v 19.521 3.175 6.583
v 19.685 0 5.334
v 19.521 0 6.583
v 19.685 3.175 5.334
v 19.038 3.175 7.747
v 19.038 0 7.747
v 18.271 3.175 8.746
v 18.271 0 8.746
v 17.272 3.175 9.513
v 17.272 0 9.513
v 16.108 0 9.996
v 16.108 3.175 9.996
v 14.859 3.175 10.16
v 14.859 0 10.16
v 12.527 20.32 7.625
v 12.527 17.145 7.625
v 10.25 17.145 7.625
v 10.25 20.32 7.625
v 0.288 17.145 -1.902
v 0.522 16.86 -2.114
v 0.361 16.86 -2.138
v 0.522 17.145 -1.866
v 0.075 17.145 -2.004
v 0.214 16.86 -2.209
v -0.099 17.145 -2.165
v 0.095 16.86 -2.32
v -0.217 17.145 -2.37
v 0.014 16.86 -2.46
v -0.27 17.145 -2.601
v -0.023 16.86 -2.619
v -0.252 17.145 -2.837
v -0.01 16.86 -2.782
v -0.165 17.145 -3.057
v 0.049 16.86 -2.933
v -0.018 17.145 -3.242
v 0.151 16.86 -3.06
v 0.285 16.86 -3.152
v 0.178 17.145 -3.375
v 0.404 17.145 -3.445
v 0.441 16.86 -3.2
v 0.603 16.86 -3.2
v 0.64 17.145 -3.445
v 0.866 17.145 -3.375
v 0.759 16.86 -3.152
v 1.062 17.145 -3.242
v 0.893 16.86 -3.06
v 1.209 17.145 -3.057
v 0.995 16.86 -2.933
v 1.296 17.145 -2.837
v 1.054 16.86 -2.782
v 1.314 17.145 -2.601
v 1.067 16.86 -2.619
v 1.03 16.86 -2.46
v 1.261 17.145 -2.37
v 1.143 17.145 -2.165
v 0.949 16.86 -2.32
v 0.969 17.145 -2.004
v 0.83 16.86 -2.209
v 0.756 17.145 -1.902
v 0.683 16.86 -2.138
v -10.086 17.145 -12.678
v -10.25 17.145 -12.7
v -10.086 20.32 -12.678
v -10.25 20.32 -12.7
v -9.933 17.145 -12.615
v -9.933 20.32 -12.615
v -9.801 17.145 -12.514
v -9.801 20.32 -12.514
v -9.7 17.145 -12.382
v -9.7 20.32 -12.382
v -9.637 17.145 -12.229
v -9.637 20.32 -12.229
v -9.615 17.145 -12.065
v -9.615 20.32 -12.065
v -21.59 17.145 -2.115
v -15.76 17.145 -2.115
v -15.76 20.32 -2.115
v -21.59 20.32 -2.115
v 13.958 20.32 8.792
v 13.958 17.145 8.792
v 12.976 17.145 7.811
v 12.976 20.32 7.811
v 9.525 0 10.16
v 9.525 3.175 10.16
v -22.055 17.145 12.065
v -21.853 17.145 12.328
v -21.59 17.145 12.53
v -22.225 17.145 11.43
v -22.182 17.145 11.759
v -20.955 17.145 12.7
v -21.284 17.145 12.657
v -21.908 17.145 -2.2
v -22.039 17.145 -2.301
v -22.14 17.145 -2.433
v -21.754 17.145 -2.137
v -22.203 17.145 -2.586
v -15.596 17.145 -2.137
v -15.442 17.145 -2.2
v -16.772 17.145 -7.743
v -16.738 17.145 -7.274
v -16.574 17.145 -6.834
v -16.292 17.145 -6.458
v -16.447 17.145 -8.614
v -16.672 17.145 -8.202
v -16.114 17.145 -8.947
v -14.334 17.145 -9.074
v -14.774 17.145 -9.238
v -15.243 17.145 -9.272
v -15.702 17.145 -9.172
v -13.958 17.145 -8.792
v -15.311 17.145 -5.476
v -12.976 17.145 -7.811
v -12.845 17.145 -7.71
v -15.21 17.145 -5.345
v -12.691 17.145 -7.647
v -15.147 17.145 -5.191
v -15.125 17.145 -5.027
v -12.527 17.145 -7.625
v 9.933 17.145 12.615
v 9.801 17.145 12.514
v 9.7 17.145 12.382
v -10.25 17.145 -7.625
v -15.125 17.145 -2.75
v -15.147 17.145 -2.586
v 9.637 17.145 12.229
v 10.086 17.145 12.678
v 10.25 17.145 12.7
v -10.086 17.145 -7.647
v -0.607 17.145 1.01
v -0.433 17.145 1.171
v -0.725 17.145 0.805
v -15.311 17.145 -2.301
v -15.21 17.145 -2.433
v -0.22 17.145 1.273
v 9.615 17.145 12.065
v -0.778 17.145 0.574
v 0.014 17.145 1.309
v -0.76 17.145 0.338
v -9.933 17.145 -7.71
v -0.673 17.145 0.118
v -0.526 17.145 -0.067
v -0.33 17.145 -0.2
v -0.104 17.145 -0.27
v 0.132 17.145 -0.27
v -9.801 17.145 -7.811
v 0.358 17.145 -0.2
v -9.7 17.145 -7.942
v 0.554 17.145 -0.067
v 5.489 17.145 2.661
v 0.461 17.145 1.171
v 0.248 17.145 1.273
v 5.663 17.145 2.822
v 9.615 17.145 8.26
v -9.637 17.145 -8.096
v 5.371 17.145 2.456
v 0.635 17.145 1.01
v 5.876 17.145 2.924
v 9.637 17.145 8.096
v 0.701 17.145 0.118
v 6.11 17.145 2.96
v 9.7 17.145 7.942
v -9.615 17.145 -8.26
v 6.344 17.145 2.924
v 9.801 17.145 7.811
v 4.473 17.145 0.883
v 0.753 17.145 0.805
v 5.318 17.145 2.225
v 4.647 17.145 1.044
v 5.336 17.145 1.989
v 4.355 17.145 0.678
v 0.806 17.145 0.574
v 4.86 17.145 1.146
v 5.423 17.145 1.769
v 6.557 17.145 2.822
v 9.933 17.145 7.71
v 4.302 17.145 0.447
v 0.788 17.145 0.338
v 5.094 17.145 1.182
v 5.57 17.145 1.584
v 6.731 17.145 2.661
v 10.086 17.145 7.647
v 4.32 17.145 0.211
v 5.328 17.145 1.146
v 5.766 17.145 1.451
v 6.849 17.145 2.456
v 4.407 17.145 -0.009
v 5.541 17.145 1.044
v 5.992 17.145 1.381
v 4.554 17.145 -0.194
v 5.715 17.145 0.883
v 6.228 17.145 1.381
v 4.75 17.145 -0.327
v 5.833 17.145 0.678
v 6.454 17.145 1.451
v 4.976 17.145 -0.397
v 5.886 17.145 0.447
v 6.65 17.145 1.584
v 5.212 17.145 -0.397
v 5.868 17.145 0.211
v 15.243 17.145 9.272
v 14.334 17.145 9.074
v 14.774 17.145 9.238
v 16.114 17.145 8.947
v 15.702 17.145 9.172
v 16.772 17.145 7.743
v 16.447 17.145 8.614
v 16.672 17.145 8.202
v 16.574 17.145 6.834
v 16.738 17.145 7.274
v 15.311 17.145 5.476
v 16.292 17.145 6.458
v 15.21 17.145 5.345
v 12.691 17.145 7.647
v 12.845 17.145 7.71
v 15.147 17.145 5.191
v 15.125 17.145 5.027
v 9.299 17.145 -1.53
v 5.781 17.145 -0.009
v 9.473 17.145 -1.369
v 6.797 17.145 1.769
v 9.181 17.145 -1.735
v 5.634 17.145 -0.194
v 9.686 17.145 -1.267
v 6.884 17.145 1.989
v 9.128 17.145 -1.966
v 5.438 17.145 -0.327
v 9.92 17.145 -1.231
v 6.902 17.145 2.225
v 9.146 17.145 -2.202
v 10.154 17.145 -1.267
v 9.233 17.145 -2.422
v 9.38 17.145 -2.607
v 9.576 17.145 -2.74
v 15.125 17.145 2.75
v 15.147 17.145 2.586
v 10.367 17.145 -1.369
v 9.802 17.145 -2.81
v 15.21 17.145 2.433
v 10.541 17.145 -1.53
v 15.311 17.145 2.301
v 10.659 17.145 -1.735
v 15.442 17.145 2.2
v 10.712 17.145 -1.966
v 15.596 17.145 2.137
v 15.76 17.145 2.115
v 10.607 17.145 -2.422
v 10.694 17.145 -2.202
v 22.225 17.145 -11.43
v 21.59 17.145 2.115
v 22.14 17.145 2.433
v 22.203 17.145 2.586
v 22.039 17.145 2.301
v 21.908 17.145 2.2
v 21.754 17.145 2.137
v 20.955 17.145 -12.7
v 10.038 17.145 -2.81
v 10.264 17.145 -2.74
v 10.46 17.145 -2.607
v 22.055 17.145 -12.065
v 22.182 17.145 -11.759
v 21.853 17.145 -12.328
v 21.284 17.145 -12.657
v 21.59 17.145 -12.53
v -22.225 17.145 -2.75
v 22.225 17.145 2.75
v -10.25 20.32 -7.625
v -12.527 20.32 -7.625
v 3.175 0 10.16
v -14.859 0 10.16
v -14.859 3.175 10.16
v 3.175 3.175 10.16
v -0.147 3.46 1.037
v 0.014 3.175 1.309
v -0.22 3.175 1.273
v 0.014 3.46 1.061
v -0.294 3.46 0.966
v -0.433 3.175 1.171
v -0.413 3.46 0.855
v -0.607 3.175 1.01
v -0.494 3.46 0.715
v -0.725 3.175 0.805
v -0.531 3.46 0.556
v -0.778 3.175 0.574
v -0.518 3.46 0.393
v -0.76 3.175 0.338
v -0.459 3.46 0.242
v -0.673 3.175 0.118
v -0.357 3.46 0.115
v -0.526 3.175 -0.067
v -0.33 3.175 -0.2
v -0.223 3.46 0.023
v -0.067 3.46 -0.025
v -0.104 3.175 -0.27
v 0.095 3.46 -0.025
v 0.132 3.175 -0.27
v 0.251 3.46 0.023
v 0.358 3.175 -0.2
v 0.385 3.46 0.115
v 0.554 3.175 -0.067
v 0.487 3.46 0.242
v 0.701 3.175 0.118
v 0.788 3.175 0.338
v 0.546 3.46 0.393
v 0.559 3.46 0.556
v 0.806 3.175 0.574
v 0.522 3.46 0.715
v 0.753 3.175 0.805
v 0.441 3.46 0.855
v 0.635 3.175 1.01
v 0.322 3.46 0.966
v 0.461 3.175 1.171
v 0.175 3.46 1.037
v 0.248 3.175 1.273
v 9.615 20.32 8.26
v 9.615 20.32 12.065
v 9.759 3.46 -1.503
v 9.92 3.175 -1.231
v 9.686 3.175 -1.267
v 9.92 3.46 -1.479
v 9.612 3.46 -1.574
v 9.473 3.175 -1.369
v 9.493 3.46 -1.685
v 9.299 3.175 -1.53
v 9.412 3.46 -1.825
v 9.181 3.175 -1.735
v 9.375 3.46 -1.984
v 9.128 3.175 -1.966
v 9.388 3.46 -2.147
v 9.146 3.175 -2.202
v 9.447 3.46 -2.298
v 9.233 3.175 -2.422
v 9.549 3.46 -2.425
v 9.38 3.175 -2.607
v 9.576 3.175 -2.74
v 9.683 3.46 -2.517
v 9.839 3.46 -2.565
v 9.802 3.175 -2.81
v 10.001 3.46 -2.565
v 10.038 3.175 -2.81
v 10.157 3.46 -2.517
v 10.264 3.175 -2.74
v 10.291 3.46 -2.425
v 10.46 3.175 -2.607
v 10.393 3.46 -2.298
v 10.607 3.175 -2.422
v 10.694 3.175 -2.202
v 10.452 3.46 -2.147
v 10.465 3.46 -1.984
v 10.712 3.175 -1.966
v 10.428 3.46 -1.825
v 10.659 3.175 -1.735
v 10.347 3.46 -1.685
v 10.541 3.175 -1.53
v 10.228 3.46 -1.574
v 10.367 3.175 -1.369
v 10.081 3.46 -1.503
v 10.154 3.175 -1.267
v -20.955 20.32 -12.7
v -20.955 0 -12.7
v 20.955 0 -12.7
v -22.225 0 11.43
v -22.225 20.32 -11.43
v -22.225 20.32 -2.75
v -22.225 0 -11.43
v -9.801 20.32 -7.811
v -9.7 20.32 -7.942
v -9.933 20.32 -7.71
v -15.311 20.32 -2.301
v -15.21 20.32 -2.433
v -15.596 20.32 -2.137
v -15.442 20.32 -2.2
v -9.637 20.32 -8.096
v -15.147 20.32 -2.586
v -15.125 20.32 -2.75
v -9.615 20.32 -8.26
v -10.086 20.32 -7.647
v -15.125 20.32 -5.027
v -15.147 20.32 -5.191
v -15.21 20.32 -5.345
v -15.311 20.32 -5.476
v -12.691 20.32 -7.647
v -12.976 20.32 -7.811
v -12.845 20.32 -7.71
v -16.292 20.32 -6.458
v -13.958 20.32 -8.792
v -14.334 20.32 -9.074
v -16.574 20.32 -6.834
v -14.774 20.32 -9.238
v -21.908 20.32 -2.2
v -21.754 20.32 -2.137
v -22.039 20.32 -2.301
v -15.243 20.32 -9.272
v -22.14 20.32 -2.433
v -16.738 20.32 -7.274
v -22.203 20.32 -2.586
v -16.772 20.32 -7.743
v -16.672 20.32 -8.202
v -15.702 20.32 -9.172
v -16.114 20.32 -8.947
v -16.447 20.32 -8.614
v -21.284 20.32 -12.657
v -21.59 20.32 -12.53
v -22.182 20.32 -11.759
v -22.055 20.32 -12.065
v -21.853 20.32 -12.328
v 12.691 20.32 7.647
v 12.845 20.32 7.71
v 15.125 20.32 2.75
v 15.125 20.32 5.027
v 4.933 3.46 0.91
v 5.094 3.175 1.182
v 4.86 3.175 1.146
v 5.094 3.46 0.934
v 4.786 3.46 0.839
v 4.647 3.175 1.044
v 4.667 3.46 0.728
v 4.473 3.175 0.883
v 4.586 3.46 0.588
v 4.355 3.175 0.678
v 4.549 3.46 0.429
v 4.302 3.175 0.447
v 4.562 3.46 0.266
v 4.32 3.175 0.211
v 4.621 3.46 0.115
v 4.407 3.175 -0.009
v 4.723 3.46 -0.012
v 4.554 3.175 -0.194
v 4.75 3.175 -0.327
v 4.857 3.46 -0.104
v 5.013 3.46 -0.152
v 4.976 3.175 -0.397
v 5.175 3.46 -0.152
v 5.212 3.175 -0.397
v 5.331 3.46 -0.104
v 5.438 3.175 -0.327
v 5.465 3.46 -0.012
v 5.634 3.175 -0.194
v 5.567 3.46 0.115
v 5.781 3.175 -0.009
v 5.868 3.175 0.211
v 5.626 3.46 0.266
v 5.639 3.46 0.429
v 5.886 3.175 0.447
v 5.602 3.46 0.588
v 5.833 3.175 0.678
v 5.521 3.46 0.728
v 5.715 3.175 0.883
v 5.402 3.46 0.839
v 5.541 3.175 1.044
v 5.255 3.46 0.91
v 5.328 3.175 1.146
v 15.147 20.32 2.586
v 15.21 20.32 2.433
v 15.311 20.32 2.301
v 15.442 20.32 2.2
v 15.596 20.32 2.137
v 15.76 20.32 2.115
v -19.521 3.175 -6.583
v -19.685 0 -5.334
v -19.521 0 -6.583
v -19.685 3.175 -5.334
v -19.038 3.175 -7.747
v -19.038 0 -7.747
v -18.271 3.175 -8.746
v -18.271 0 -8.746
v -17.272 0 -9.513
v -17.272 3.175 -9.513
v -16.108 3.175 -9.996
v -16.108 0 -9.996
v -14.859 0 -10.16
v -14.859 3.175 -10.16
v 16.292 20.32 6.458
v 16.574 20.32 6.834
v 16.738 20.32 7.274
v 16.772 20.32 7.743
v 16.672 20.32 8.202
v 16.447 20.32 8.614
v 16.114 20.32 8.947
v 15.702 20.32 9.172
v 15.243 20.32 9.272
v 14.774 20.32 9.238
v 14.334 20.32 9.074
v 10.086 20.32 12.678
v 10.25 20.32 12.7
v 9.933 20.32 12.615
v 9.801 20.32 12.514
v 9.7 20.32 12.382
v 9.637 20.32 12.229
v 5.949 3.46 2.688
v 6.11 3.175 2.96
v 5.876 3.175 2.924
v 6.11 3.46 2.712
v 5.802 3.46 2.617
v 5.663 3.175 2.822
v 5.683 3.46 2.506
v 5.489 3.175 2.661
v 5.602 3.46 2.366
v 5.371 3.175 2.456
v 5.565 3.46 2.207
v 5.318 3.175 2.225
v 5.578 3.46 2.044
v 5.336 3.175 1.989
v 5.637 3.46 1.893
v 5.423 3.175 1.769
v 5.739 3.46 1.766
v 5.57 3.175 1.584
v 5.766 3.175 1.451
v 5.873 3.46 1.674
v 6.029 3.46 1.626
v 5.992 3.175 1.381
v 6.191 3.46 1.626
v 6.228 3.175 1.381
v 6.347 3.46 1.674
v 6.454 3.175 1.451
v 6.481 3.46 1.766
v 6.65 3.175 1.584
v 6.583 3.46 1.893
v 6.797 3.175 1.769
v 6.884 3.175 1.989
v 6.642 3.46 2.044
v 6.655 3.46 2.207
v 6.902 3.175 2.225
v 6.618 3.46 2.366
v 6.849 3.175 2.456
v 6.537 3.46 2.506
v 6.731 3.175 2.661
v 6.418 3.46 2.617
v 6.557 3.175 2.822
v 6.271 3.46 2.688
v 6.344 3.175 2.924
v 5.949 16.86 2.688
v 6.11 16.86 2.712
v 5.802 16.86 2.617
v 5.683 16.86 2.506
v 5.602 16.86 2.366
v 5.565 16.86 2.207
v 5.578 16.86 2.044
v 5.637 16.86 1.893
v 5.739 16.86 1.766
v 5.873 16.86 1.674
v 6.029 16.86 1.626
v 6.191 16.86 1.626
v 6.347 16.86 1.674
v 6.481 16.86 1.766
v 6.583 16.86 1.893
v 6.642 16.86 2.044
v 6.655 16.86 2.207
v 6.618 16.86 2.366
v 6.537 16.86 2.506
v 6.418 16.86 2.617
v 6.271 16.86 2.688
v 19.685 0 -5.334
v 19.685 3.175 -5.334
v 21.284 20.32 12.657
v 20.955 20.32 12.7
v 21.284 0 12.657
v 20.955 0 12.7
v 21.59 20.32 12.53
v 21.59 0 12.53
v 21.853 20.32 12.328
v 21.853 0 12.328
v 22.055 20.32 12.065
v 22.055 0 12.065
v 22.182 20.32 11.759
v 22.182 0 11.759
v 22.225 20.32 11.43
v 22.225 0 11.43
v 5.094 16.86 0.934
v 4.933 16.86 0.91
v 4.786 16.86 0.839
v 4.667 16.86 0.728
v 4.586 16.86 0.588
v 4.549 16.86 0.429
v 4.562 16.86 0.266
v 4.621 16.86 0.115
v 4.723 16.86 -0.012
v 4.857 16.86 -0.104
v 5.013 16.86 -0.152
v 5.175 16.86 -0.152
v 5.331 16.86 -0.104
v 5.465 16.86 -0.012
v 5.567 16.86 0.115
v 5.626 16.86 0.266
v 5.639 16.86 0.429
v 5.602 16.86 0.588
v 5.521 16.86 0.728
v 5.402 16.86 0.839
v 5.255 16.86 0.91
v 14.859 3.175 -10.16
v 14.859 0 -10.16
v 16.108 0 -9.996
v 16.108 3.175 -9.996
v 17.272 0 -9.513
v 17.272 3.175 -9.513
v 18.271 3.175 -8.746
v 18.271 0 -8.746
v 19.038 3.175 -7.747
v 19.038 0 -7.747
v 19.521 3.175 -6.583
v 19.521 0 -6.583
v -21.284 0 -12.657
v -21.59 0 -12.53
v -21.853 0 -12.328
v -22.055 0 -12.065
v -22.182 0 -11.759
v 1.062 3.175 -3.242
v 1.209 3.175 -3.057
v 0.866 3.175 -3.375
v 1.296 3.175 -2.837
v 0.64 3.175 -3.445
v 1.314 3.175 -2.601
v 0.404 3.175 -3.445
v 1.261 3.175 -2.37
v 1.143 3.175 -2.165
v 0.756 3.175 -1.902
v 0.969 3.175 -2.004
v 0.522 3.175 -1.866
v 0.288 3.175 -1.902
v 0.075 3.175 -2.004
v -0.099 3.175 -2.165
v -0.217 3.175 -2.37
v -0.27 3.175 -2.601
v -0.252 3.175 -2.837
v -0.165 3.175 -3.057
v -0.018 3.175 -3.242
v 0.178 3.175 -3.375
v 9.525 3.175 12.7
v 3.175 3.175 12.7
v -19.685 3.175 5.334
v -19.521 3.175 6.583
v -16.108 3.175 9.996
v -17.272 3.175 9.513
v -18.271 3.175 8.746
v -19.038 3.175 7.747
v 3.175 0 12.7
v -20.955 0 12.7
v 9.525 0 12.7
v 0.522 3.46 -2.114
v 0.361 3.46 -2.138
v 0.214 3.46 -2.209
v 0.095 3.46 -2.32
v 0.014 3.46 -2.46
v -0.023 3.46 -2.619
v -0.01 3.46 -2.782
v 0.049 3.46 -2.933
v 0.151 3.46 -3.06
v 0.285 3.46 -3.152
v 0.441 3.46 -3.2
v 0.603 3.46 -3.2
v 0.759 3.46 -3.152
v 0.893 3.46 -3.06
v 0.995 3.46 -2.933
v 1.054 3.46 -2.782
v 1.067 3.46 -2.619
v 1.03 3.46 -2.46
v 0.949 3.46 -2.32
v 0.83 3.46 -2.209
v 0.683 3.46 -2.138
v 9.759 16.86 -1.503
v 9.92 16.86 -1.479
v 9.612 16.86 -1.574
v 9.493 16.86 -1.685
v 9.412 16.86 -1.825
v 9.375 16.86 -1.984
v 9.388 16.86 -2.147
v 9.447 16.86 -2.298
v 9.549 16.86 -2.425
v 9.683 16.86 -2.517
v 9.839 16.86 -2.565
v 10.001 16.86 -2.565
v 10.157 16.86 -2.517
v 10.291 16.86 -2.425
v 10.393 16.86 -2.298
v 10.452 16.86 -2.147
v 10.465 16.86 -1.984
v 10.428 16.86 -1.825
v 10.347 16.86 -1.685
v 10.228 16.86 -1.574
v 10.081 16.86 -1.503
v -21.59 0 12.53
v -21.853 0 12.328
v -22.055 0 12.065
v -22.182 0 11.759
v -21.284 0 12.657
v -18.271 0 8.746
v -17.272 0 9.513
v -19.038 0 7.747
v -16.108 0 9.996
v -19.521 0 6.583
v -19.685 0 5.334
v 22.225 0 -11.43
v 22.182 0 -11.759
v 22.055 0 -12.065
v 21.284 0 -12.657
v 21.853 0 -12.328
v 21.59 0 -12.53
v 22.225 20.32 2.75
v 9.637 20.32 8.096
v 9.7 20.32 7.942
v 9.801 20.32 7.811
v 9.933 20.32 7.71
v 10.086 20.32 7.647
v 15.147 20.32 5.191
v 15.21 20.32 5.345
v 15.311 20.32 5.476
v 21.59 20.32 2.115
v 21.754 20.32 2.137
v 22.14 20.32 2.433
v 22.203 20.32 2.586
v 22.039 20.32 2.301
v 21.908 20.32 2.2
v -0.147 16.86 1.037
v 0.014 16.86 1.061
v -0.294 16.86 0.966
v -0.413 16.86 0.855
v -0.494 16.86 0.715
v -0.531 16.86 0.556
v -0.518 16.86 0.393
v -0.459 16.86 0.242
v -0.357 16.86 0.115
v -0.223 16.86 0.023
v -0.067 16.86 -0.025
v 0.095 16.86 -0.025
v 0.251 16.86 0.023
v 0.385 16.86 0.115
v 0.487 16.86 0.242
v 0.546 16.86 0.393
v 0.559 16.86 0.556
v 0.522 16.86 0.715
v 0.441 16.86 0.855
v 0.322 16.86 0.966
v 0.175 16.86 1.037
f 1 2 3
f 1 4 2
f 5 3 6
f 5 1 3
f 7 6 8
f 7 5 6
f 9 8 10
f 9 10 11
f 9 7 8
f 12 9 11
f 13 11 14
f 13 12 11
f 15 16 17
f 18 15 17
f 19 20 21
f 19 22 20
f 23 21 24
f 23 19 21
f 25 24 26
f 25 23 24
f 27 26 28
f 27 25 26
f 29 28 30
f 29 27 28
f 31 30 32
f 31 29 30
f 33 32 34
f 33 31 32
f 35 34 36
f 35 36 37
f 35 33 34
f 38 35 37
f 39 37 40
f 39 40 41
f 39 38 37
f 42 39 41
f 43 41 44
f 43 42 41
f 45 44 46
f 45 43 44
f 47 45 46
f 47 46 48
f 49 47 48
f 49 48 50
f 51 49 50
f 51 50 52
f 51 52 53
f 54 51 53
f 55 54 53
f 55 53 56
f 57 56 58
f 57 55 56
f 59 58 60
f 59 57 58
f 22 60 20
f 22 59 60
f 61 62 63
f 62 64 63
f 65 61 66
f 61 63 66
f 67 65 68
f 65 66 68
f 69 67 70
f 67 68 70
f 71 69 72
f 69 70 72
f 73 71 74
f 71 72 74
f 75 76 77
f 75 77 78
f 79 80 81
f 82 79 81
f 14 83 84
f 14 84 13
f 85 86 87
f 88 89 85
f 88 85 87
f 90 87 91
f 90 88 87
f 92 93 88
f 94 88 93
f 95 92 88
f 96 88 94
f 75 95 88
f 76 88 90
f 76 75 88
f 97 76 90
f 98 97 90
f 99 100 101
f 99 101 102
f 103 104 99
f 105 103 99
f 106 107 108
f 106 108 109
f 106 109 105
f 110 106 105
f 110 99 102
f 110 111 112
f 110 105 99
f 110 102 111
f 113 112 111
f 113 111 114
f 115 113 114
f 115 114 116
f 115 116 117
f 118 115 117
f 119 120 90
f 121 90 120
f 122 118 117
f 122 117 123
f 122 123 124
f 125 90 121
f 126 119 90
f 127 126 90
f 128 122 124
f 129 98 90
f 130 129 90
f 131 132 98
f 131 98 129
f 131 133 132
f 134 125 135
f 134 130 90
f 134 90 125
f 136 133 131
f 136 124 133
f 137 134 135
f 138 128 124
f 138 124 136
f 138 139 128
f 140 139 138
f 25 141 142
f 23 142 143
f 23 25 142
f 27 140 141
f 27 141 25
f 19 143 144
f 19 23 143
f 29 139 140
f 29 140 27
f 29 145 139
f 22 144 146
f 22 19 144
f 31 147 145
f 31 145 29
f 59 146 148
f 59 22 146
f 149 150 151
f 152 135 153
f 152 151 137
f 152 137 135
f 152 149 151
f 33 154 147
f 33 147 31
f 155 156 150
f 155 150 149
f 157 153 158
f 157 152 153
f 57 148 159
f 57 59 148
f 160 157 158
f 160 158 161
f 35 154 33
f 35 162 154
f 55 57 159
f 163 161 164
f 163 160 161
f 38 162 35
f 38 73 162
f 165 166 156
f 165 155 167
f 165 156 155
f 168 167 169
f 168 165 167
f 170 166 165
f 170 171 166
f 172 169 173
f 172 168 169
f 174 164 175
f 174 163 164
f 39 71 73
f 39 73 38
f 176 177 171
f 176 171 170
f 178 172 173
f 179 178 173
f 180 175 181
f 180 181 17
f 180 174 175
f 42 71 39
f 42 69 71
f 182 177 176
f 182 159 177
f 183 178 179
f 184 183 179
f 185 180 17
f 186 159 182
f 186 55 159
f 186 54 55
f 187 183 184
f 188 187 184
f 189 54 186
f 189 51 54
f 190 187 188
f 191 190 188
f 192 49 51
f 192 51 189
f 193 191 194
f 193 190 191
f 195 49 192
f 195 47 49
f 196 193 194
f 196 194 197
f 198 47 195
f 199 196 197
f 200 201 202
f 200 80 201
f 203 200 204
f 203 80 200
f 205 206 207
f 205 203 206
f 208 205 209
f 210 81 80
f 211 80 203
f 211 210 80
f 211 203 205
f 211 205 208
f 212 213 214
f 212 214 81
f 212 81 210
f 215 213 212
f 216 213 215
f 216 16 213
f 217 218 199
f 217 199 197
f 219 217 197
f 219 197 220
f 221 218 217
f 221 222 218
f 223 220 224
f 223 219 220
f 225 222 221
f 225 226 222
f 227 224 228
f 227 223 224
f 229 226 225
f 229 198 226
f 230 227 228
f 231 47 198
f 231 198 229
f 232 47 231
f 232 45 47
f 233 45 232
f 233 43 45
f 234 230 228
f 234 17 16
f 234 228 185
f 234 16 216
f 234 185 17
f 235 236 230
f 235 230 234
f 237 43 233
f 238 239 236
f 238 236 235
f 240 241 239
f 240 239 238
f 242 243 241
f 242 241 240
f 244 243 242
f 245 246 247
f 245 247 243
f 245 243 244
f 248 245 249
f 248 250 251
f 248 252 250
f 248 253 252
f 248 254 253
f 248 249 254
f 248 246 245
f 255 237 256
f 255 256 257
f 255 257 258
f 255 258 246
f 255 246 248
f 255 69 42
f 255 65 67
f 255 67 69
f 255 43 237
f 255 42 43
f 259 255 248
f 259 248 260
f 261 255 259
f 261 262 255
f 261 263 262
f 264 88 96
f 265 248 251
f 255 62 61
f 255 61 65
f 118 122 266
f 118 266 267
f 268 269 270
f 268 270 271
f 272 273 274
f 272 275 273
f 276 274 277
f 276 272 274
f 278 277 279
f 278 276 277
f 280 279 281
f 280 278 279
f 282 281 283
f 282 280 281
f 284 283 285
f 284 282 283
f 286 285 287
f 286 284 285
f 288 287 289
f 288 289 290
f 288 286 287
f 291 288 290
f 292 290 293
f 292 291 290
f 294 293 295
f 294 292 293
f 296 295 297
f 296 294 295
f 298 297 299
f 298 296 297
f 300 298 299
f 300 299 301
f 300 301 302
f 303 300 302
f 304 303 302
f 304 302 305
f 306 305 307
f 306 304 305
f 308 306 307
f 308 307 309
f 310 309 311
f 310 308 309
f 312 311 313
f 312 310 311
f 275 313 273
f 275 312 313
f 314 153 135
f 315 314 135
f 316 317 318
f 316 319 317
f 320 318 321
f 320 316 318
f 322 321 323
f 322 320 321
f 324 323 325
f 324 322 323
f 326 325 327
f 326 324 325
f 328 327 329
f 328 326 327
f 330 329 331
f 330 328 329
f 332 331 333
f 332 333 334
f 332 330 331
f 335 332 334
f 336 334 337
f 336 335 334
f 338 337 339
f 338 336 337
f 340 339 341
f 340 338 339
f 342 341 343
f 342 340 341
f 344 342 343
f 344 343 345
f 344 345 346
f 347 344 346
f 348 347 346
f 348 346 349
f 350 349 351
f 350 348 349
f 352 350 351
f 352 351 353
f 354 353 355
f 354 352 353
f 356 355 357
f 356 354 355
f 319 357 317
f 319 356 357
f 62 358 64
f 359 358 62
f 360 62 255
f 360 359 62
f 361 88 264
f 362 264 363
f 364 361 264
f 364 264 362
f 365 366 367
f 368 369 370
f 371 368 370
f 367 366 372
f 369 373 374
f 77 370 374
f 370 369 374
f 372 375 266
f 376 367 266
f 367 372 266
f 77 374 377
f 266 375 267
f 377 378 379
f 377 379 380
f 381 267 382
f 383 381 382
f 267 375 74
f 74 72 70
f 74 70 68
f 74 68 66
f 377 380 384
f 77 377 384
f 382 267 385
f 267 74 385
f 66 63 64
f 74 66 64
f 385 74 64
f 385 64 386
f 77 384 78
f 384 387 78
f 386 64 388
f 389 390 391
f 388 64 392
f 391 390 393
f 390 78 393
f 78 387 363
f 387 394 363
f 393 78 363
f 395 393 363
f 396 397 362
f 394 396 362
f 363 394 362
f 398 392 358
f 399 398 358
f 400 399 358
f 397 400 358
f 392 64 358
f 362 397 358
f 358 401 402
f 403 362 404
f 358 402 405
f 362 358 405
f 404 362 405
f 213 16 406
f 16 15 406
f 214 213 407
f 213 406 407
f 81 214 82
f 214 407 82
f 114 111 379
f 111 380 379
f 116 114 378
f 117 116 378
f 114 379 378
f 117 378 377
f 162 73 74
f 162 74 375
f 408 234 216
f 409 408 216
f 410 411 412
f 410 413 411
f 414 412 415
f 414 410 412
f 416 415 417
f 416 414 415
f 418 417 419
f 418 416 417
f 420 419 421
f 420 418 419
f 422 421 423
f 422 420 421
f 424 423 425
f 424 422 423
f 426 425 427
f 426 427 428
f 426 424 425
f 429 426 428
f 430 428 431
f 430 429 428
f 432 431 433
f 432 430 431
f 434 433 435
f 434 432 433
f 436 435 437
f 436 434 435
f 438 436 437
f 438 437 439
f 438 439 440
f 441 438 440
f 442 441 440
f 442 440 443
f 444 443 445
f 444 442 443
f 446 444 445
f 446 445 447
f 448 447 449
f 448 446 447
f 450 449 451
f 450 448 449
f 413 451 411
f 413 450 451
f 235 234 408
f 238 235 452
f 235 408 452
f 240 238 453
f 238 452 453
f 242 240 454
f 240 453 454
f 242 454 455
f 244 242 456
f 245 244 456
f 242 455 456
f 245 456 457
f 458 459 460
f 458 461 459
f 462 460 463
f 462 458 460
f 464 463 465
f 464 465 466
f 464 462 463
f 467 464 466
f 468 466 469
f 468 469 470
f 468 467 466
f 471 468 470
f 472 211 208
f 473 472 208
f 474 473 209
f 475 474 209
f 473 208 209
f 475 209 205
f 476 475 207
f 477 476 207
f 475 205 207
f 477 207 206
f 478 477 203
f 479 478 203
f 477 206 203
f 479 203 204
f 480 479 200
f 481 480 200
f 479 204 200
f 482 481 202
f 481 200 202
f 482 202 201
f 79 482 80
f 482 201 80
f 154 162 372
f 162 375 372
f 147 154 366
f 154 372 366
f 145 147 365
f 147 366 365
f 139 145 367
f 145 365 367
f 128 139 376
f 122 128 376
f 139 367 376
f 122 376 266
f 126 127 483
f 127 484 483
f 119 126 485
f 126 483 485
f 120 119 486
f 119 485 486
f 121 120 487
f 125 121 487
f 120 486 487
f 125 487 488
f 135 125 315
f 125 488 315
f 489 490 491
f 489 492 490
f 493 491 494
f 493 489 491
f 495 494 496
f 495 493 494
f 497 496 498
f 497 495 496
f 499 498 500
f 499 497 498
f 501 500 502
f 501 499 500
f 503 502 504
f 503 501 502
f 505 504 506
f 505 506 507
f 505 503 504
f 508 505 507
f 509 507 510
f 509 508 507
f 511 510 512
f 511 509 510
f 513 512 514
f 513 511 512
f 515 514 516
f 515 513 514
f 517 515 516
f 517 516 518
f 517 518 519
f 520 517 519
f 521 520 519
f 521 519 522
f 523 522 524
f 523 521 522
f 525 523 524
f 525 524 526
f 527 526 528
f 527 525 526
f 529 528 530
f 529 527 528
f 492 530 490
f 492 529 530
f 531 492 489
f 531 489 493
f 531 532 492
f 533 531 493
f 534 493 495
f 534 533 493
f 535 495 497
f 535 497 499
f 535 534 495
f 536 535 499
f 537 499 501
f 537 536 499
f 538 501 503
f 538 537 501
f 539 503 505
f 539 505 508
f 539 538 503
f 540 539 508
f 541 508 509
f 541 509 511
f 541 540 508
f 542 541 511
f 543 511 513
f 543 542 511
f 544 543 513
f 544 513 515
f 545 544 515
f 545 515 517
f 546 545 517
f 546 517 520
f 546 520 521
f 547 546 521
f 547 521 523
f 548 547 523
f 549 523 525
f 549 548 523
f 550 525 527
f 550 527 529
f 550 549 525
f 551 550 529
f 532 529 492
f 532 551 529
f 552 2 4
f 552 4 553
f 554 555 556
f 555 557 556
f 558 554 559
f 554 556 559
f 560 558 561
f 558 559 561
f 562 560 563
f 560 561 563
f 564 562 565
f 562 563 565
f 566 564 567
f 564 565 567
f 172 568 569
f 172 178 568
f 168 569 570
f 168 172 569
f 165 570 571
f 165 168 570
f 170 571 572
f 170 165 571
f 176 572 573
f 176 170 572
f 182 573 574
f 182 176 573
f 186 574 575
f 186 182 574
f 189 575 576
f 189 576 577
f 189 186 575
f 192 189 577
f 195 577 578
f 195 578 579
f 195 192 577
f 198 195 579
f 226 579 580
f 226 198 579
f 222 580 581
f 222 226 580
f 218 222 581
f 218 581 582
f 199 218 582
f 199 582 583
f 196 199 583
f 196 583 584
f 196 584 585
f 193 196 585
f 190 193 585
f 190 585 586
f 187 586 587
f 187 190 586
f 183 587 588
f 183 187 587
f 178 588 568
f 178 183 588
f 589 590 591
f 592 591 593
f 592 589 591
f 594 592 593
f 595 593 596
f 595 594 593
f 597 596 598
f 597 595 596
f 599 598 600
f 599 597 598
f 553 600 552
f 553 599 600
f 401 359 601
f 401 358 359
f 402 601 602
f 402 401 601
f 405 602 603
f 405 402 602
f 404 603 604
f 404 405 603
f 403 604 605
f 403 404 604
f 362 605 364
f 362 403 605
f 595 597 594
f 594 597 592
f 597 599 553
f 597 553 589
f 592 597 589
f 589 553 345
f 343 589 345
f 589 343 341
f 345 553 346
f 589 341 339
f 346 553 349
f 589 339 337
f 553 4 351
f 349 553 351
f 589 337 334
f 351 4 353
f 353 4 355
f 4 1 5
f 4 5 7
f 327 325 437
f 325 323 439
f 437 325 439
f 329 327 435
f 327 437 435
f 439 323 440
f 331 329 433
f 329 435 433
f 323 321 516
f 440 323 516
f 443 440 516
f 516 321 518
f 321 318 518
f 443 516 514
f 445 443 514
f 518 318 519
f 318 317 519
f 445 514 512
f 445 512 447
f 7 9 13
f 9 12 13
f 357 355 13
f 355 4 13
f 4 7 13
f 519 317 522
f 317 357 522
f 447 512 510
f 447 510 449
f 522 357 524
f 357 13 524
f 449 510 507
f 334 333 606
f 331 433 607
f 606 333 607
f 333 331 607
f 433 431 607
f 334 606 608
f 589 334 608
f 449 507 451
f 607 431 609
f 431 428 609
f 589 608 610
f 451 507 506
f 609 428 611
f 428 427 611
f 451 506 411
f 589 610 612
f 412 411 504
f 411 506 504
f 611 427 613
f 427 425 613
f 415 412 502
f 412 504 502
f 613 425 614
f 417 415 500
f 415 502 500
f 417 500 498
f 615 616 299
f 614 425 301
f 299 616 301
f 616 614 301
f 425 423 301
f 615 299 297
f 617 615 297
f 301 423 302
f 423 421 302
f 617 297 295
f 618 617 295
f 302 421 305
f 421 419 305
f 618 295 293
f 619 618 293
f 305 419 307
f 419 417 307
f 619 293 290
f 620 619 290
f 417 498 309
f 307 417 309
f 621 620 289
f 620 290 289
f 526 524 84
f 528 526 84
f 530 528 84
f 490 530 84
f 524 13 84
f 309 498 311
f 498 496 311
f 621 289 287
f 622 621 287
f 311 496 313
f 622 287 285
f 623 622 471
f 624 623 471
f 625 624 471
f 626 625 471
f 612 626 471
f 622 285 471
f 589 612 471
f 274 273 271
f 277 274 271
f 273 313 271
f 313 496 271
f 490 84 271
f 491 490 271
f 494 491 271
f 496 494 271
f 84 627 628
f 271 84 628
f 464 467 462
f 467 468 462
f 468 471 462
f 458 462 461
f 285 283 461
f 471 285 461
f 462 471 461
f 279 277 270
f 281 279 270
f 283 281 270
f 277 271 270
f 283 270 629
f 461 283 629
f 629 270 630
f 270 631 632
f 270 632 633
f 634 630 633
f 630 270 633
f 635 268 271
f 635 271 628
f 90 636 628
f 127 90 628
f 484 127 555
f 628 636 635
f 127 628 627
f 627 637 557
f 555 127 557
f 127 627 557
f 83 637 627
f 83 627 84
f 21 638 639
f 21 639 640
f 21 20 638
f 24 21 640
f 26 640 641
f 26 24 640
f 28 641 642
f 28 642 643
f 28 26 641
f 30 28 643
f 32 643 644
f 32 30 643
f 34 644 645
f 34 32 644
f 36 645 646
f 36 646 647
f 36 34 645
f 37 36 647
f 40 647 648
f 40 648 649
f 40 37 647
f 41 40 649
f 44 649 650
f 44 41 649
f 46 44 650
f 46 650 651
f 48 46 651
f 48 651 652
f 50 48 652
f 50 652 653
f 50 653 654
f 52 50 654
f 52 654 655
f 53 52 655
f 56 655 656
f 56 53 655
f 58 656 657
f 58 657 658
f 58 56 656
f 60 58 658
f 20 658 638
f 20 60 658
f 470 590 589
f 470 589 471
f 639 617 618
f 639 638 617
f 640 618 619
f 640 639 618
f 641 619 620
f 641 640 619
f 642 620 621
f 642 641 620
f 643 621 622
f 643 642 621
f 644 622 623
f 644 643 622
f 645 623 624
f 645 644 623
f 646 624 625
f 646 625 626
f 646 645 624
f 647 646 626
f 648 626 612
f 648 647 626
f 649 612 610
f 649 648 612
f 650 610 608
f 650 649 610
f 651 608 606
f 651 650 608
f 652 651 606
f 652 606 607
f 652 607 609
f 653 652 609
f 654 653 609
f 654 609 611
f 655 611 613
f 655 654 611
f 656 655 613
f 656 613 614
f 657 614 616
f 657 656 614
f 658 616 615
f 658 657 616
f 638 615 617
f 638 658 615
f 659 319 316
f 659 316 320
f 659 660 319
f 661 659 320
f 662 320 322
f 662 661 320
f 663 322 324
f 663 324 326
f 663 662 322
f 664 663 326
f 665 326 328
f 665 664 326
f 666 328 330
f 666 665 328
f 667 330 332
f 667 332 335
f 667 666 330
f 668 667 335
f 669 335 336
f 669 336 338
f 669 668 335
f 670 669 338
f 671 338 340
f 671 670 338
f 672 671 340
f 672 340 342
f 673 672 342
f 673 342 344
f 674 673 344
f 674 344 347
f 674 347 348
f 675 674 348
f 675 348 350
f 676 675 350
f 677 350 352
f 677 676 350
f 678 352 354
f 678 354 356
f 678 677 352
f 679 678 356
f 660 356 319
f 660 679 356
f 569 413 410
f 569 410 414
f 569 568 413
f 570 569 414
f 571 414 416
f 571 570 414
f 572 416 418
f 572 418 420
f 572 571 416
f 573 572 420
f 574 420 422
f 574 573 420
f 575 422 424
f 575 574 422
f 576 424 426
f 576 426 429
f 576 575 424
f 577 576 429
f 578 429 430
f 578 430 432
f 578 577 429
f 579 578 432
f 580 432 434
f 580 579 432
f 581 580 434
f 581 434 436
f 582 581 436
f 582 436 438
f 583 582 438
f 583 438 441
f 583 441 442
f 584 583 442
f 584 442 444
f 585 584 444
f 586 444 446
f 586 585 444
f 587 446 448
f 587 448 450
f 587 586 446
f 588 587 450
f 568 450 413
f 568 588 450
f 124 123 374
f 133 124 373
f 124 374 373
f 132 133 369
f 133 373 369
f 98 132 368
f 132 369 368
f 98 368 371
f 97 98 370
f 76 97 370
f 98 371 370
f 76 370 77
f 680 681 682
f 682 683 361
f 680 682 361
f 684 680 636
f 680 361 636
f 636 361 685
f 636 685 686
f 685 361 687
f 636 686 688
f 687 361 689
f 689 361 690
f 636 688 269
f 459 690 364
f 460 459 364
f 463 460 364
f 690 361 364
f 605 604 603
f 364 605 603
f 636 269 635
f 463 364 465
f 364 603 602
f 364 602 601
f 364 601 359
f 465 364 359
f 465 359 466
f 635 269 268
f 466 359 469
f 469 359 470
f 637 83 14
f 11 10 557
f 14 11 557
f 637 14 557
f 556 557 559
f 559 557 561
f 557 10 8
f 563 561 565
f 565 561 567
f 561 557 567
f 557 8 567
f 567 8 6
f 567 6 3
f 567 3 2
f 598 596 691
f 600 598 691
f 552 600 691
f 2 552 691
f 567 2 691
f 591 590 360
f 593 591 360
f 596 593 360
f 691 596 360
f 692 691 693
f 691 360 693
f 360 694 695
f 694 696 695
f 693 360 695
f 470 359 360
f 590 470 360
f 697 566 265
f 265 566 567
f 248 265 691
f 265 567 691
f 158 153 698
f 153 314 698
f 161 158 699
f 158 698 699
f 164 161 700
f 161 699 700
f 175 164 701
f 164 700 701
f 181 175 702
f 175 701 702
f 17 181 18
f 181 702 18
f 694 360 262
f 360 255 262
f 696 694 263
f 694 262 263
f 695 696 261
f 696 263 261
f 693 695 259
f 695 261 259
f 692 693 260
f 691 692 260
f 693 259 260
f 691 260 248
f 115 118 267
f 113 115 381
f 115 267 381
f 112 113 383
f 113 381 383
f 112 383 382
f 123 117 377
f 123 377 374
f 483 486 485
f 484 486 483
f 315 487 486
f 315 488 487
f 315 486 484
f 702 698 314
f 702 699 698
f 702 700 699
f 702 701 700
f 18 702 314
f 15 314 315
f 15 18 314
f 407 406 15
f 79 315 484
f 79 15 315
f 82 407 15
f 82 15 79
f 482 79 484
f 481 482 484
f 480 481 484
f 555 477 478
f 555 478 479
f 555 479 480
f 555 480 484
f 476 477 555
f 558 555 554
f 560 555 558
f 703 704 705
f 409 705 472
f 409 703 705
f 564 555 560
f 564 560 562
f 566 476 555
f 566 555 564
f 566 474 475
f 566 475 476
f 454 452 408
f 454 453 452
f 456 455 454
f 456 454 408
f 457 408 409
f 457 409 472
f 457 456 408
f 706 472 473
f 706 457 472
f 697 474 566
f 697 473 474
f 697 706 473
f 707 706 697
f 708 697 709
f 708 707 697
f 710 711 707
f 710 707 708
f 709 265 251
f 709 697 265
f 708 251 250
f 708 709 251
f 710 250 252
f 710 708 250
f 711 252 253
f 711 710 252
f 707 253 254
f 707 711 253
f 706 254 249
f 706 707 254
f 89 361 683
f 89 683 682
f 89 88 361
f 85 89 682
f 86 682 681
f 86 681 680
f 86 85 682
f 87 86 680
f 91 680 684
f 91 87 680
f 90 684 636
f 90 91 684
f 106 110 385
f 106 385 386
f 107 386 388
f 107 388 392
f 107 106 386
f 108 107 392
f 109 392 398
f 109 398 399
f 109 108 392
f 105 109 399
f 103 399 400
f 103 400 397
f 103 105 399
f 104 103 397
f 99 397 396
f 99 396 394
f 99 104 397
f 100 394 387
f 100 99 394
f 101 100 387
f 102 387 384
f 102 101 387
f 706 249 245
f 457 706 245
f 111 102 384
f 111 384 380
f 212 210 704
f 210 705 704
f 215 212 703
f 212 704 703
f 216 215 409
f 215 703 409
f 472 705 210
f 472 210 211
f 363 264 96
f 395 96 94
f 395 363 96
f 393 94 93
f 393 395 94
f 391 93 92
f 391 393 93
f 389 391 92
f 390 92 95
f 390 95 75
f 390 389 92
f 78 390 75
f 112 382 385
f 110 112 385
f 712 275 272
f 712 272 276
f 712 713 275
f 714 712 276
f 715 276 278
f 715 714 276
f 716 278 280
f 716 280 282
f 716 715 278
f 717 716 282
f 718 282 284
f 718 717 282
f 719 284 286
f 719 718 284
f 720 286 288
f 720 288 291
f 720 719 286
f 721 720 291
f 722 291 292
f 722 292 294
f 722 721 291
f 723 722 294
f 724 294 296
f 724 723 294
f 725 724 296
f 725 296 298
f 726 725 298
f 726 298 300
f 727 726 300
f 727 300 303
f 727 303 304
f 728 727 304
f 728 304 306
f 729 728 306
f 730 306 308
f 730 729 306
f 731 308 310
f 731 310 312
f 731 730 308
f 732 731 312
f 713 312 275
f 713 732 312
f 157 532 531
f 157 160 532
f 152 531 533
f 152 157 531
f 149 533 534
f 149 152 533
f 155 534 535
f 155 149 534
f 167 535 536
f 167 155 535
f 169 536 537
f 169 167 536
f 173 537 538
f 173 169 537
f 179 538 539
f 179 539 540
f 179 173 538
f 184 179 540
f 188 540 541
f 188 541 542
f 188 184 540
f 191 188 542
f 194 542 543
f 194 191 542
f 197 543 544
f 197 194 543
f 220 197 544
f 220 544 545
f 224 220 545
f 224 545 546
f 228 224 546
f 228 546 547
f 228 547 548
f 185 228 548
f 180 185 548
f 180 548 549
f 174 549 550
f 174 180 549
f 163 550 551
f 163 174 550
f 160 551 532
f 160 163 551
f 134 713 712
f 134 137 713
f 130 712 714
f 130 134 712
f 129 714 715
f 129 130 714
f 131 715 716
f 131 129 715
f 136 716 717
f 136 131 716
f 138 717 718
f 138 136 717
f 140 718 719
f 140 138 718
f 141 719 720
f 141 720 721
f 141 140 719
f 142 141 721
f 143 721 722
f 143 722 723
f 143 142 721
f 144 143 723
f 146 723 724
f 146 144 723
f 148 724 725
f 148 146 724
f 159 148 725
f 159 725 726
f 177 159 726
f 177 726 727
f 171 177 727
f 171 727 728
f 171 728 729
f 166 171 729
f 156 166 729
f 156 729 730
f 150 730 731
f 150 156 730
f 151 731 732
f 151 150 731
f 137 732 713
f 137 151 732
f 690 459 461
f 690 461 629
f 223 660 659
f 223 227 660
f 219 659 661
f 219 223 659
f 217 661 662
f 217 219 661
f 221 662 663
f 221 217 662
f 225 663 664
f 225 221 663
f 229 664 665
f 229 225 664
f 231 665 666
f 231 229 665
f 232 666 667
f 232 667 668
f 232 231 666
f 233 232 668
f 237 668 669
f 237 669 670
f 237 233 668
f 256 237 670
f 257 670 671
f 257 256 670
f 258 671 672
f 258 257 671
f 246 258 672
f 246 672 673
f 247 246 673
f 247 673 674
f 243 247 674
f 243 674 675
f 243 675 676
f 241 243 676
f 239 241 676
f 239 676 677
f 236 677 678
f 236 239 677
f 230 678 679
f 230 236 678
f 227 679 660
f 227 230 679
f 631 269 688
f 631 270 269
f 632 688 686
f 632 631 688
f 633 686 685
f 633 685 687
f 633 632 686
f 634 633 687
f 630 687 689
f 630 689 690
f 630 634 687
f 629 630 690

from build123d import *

# Parameters (mm, degrees)
SKETCH1_W                            = 44.45
SKETCH1_H                            = 25.4
BOSS_EXTRUDE1_DEPTH                  = 17.145
BOSS_EXTRUDE2_DEPTH                  = 3.175
CUT_EXTRUDE1_DEPTH                   = 3.175
F_57_0_043_DIAMETER_HOLE1_AT_2_COUNT = 2
F_57_0_043_DIAMETER_HOLE1_AT_2_PITCH = 5.663972193
F_57_0_043_DIAMETER_HOLE1_AT_3_COUNT = 2
F_57_0_043_DIAMETER_HOLE1_AT_3_PITCH = 5.39563203
F_57_0_043_DIAMETER_HOLE1_AT_4_COUNT = 2
F_57_0_043_DIAMETER_HOLE1_AT_4_PITCH = 10.226457647
F_57_0_043_DIAMETER_HOLE1_AT_5_COUNT = 2
F_57_0_043_DIAMETER_HOLE1_AT_5_PITCH = 9.419428274
FILLET1_R                            = 0.635
FILLET2_R                            = 1.27
FILLET3_R                            = 4.826


with BuildPart() as part:
    # Sketch1 → Boss-Extrude1 (new body)
    with BuildSketch(Plane(origin=(0, 0, 0), x_dir=(1, 0, 0), z_dir=(0, 1, 0))):
        Rectangle(SKETCH1_W, SKETCH1_H)
    extrude(amount=BOSS_EXTRUDE1_DEPTH)

    # Sketch2 → Boss-Extrude2 (add)
    with BuildSketch(Plane(origin=(0, 17.145, 0), x_dir=(1, 0, 0), z_dir=(0, 1, 0))):
        with BuildLine():
            Line((-22.225, 12.7), (-9.615133409, 12.7))
            Line((-9.615133409, 12.7), (-9.615133409, 7.625))
            Line((-9.615133409, 7.625), (-12.790133409, 7.625))
            Line((-12.790133409, 7.625), (-13.957566704, 8.792433296))
            ThreePointArc((-13.957566704, 8.792433296), (-16.292433296, 8.792433296), (-16.292433296, 6.457566704))
            Line((-16.292433296, 6.457566704), (-15.125, 5.290133409))
            Line((-15.125, 5.290133409), (-15.125, 2.115133409))
            Line((-15.125, 2.115133409), (-22.225, 2.115133409))
            Line((-22.225, 2.115133409), (-22.225, 12.7))
        make_face()
        with BuildLine():
            Line((22.225, -12.7), (22.225, -2.115133409))
            Line((22.225, -2.115133409), (15.125, -2.115133409))
            Line((15.125, -2.115133409), (15.125, -5.290133409))
            Line((15.125, -5.290133409), (16.292433296, -6.457566704))
            ThreePointArc((16.292433296, -6.457566704), (16.292433296, -8.792433296), (13.957566704, -8.792433296))
            Line((13.957566704, -8.792433296), (12.790133409, -7.625))
            Line((12.790133409, -7.625), (9.615133409, -7.625))
            Line((9.615133409, -7.625), (9.615133409, -12.7))
            Line((9.615133409, -12.7), (22.225, -12.7))
        make_face()
    extrude(amount=BOSS_EXTRUDE2_DEPTH)

    # Sketch6 → Cut-Extrude1 (cut)
    with BuildSketch(Plane.XZ):
        Polygon((3.175, 10.16), (3.175, 12.7), (9.525, 12.7), (9.525, 10.16), (19.685, 10.16), (19.685, -10.16), (-19.685, -10.16), (-19.685, 10.16), align=None)
    extrude(amount=-CUT_EXTRUDE1_DEPTH, mode=Mode.SUBTRACT)

    # Sketch4 → #57 (0.043) Diameter Hole1 (revolve, cut)
    with BuildSketch(Plane(origin=(9.92, 17.145, -2.025), x_dir=(0, 0, 1), z_dir=(1, 0, 0))):
        Polygon((0, 0), (0, 13.97), (0.79375, 13.97), (0.5461, 13.685111264), (0.5461, 0.284888736), (0.79375, 0), align=None)
    f_57_0_043_diameter_hole1 = revolve(axis=Axis((9.92, 23.495, -2.025), (0, -1, 0)), mode=Mode.SUBTRACT)

    # #57 (0.043) Diameter Hole1 at 2: #57 (0.043) Diameter Hole1 ×2
    with Locations(*[Vector(-0.6726727939963121, 0, 0.7399400733959441) * (i * F_57_0_043_DIAMETER_HOLE1_AT_2_PITCH) for i in range(1, F_57_0_043_DIAMETER_HOLE1_AT_2_COUNT)]):
        add(f_57_0_043_diameter_hole1, mode=Mode.SUBTRACT)

    # #57 (0.043) Diameter Hole1 at 3: #57 (0.043) Diameter Hole1 ×2
    with Locations(*[Vector(-0.894427190999916, 0, 0.447213595499958) * (i * F_57_0_043_DIAMETER_HOLE1_AT_3_PITCH) for i in range(1, F_57_0_043_DIAMETER_HOLE1_AT_3_COUNT)]):
        add(f_57_0_043_diameter_hole1, mode=Mode.SUBTRACT)

    # #57 (0.043) Diameter Hole1 at 4: #57 (0.043) Diameter Hole1 ×2
    with Locations(*[Vector(-0.968663866044045, 0, 0.24837535026770383) * (i * F_57_0_043_DIAMETER_HOLE1_AT_4_PITCH) for i in range(1, F_57_0_043_DIAMETER_HOLE1_AT_4_COUNT)]):
        add(f_57_0_043_diameter_hole1, mode=Mode.SUBTRACT)

    # #57 (0.043) Diameter Hole1 at 5: #57 (0.043) Diameter Hole1 ×2
    with Locations(*[Vector(-0.9977250982863921, 0, -0.06741385799232386) * (i * F_57_0_043_DIAMETER_HOLE1_AT_5_PITCH) for i in range(1, F_57_0_043_DIAMETER_HOLE1_AT_5_COUNT)]):
        add(f_57_0_043_diameter_hole1, mode=Mode.SUBTRACT)

    # Fillet1
    fillet1_edges = [part.edges().sort_by_distance(p)[0] for p in [
        (9.615133409, 18.7325, 12.7),
        (22.225, 18.7325, 2.115133409),
        (9.615133409, 18.7325, 7.625),
        (12.790133409, 18.7325, 7.625),
        (15.125, 18.7325, 5.290133409),
        (15.125, 18.7325, 2.115133409),
        (-9.615133409, 18.7325, -12.7),
        (-9.615133409, 18.7325, -7.625),
        (-12.790133409, 18.7325, -7.625),
        (-15.125, 18.7325, -5.290133409),
        (-15.125, 18.7325, -2.115133409),
        (-22.225, 18.7325, -2.115133409),
    ]]
    fillet(fillet1_edges, radius=FILLET1_R)

    # Fillet2
    fillet2_edges = [part.edges().sort_by_distance(p)[0] for p in [
        (22.225, 8.5725, -12.7),
        (22.225, 10.16, 12.7),
        (-22.225, 8.5725, 12.7),
        (-22.225, 10.16, -12.7),
    ]]
    fillet(fillet2_edges, radius=FILLET2_R)

    # Fillet3
    fillet3_edges = [part.edges().sort_by_distance(p)[0] for p in [
        (-19.685, 1.5875, 10.16),
        (19.685, 1.5875, 10.16),
        (19.685, 1.5875, -10.16),
        (-19.685, 1.5875, -10.16),
    ]]
    fillet(fillet3_edges, radius=FILLET3_R)


solid = part.part
